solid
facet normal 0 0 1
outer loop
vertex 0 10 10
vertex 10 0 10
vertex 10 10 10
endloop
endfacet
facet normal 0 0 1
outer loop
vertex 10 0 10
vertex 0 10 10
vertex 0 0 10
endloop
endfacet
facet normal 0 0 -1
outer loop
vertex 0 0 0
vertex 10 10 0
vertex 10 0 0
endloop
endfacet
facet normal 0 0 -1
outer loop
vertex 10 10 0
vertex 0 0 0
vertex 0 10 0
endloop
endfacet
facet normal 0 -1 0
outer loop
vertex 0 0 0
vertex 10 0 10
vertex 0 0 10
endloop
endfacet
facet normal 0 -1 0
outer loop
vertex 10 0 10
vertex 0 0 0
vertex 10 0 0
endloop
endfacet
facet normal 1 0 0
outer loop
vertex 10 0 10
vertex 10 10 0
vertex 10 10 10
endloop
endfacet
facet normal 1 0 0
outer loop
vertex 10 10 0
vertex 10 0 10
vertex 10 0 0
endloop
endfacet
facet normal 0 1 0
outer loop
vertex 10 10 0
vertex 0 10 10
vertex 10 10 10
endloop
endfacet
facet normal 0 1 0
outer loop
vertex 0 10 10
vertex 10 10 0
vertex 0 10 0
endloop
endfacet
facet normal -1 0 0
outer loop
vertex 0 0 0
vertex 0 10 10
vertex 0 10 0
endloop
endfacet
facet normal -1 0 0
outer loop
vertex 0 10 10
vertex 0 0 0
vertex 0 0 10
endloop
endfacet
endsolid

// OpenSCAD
cube(size = 10);
/* Generated from the following ExpSolid code:

#! /usr/bin/env python

from pathlib import Path

from solid2 import cube, register_post_render

# =============
# = Extension =
# =============
# This is more or less the same as -- regular -- SolidPython does when it
# writes a scad file. It appends the python source to the end of the *.scad
# file.
#
# If you like this, you can simply import this extension that should do it.
#
# register the post_render extension using the decorator. This hooks it into
# the "_render" routine. It will be called after the root gets rendered. It's
# return string will be appended to the rendered string.
@register_post_render
def attach_code_post_render(_):
    #find the "root" file
    calling_file = None

    import __main__
    # not called from a terminal?
    if hasattr(__main__, "__file__"):
        # extract filename and replace suffix
        calling_file = Path(__main__.__file__).absolute()
    else:
        return '' # no code available. Called from withing a python shell

    assert(calling_file.exists())

    # read source file
    with calling_file.open("r") as f:
        code_str = f.read()

        # escape /_* and *_/ because otherwise it would end this comment block which
        # we use to inject the solid code
        code_str = code_str.replace("/_*", "/_*")
        code_str = code_str.replace("*_/", "*_/")

        # return the string to be appended to the *.scad file
        return f'/_* Generated from the following ExpSolid code:\n\n' +\
               f'{code_str}*_/'

# =============

if __name__ == "__main__":
    c = cube(10)
    c.save_as_scad()

*/
